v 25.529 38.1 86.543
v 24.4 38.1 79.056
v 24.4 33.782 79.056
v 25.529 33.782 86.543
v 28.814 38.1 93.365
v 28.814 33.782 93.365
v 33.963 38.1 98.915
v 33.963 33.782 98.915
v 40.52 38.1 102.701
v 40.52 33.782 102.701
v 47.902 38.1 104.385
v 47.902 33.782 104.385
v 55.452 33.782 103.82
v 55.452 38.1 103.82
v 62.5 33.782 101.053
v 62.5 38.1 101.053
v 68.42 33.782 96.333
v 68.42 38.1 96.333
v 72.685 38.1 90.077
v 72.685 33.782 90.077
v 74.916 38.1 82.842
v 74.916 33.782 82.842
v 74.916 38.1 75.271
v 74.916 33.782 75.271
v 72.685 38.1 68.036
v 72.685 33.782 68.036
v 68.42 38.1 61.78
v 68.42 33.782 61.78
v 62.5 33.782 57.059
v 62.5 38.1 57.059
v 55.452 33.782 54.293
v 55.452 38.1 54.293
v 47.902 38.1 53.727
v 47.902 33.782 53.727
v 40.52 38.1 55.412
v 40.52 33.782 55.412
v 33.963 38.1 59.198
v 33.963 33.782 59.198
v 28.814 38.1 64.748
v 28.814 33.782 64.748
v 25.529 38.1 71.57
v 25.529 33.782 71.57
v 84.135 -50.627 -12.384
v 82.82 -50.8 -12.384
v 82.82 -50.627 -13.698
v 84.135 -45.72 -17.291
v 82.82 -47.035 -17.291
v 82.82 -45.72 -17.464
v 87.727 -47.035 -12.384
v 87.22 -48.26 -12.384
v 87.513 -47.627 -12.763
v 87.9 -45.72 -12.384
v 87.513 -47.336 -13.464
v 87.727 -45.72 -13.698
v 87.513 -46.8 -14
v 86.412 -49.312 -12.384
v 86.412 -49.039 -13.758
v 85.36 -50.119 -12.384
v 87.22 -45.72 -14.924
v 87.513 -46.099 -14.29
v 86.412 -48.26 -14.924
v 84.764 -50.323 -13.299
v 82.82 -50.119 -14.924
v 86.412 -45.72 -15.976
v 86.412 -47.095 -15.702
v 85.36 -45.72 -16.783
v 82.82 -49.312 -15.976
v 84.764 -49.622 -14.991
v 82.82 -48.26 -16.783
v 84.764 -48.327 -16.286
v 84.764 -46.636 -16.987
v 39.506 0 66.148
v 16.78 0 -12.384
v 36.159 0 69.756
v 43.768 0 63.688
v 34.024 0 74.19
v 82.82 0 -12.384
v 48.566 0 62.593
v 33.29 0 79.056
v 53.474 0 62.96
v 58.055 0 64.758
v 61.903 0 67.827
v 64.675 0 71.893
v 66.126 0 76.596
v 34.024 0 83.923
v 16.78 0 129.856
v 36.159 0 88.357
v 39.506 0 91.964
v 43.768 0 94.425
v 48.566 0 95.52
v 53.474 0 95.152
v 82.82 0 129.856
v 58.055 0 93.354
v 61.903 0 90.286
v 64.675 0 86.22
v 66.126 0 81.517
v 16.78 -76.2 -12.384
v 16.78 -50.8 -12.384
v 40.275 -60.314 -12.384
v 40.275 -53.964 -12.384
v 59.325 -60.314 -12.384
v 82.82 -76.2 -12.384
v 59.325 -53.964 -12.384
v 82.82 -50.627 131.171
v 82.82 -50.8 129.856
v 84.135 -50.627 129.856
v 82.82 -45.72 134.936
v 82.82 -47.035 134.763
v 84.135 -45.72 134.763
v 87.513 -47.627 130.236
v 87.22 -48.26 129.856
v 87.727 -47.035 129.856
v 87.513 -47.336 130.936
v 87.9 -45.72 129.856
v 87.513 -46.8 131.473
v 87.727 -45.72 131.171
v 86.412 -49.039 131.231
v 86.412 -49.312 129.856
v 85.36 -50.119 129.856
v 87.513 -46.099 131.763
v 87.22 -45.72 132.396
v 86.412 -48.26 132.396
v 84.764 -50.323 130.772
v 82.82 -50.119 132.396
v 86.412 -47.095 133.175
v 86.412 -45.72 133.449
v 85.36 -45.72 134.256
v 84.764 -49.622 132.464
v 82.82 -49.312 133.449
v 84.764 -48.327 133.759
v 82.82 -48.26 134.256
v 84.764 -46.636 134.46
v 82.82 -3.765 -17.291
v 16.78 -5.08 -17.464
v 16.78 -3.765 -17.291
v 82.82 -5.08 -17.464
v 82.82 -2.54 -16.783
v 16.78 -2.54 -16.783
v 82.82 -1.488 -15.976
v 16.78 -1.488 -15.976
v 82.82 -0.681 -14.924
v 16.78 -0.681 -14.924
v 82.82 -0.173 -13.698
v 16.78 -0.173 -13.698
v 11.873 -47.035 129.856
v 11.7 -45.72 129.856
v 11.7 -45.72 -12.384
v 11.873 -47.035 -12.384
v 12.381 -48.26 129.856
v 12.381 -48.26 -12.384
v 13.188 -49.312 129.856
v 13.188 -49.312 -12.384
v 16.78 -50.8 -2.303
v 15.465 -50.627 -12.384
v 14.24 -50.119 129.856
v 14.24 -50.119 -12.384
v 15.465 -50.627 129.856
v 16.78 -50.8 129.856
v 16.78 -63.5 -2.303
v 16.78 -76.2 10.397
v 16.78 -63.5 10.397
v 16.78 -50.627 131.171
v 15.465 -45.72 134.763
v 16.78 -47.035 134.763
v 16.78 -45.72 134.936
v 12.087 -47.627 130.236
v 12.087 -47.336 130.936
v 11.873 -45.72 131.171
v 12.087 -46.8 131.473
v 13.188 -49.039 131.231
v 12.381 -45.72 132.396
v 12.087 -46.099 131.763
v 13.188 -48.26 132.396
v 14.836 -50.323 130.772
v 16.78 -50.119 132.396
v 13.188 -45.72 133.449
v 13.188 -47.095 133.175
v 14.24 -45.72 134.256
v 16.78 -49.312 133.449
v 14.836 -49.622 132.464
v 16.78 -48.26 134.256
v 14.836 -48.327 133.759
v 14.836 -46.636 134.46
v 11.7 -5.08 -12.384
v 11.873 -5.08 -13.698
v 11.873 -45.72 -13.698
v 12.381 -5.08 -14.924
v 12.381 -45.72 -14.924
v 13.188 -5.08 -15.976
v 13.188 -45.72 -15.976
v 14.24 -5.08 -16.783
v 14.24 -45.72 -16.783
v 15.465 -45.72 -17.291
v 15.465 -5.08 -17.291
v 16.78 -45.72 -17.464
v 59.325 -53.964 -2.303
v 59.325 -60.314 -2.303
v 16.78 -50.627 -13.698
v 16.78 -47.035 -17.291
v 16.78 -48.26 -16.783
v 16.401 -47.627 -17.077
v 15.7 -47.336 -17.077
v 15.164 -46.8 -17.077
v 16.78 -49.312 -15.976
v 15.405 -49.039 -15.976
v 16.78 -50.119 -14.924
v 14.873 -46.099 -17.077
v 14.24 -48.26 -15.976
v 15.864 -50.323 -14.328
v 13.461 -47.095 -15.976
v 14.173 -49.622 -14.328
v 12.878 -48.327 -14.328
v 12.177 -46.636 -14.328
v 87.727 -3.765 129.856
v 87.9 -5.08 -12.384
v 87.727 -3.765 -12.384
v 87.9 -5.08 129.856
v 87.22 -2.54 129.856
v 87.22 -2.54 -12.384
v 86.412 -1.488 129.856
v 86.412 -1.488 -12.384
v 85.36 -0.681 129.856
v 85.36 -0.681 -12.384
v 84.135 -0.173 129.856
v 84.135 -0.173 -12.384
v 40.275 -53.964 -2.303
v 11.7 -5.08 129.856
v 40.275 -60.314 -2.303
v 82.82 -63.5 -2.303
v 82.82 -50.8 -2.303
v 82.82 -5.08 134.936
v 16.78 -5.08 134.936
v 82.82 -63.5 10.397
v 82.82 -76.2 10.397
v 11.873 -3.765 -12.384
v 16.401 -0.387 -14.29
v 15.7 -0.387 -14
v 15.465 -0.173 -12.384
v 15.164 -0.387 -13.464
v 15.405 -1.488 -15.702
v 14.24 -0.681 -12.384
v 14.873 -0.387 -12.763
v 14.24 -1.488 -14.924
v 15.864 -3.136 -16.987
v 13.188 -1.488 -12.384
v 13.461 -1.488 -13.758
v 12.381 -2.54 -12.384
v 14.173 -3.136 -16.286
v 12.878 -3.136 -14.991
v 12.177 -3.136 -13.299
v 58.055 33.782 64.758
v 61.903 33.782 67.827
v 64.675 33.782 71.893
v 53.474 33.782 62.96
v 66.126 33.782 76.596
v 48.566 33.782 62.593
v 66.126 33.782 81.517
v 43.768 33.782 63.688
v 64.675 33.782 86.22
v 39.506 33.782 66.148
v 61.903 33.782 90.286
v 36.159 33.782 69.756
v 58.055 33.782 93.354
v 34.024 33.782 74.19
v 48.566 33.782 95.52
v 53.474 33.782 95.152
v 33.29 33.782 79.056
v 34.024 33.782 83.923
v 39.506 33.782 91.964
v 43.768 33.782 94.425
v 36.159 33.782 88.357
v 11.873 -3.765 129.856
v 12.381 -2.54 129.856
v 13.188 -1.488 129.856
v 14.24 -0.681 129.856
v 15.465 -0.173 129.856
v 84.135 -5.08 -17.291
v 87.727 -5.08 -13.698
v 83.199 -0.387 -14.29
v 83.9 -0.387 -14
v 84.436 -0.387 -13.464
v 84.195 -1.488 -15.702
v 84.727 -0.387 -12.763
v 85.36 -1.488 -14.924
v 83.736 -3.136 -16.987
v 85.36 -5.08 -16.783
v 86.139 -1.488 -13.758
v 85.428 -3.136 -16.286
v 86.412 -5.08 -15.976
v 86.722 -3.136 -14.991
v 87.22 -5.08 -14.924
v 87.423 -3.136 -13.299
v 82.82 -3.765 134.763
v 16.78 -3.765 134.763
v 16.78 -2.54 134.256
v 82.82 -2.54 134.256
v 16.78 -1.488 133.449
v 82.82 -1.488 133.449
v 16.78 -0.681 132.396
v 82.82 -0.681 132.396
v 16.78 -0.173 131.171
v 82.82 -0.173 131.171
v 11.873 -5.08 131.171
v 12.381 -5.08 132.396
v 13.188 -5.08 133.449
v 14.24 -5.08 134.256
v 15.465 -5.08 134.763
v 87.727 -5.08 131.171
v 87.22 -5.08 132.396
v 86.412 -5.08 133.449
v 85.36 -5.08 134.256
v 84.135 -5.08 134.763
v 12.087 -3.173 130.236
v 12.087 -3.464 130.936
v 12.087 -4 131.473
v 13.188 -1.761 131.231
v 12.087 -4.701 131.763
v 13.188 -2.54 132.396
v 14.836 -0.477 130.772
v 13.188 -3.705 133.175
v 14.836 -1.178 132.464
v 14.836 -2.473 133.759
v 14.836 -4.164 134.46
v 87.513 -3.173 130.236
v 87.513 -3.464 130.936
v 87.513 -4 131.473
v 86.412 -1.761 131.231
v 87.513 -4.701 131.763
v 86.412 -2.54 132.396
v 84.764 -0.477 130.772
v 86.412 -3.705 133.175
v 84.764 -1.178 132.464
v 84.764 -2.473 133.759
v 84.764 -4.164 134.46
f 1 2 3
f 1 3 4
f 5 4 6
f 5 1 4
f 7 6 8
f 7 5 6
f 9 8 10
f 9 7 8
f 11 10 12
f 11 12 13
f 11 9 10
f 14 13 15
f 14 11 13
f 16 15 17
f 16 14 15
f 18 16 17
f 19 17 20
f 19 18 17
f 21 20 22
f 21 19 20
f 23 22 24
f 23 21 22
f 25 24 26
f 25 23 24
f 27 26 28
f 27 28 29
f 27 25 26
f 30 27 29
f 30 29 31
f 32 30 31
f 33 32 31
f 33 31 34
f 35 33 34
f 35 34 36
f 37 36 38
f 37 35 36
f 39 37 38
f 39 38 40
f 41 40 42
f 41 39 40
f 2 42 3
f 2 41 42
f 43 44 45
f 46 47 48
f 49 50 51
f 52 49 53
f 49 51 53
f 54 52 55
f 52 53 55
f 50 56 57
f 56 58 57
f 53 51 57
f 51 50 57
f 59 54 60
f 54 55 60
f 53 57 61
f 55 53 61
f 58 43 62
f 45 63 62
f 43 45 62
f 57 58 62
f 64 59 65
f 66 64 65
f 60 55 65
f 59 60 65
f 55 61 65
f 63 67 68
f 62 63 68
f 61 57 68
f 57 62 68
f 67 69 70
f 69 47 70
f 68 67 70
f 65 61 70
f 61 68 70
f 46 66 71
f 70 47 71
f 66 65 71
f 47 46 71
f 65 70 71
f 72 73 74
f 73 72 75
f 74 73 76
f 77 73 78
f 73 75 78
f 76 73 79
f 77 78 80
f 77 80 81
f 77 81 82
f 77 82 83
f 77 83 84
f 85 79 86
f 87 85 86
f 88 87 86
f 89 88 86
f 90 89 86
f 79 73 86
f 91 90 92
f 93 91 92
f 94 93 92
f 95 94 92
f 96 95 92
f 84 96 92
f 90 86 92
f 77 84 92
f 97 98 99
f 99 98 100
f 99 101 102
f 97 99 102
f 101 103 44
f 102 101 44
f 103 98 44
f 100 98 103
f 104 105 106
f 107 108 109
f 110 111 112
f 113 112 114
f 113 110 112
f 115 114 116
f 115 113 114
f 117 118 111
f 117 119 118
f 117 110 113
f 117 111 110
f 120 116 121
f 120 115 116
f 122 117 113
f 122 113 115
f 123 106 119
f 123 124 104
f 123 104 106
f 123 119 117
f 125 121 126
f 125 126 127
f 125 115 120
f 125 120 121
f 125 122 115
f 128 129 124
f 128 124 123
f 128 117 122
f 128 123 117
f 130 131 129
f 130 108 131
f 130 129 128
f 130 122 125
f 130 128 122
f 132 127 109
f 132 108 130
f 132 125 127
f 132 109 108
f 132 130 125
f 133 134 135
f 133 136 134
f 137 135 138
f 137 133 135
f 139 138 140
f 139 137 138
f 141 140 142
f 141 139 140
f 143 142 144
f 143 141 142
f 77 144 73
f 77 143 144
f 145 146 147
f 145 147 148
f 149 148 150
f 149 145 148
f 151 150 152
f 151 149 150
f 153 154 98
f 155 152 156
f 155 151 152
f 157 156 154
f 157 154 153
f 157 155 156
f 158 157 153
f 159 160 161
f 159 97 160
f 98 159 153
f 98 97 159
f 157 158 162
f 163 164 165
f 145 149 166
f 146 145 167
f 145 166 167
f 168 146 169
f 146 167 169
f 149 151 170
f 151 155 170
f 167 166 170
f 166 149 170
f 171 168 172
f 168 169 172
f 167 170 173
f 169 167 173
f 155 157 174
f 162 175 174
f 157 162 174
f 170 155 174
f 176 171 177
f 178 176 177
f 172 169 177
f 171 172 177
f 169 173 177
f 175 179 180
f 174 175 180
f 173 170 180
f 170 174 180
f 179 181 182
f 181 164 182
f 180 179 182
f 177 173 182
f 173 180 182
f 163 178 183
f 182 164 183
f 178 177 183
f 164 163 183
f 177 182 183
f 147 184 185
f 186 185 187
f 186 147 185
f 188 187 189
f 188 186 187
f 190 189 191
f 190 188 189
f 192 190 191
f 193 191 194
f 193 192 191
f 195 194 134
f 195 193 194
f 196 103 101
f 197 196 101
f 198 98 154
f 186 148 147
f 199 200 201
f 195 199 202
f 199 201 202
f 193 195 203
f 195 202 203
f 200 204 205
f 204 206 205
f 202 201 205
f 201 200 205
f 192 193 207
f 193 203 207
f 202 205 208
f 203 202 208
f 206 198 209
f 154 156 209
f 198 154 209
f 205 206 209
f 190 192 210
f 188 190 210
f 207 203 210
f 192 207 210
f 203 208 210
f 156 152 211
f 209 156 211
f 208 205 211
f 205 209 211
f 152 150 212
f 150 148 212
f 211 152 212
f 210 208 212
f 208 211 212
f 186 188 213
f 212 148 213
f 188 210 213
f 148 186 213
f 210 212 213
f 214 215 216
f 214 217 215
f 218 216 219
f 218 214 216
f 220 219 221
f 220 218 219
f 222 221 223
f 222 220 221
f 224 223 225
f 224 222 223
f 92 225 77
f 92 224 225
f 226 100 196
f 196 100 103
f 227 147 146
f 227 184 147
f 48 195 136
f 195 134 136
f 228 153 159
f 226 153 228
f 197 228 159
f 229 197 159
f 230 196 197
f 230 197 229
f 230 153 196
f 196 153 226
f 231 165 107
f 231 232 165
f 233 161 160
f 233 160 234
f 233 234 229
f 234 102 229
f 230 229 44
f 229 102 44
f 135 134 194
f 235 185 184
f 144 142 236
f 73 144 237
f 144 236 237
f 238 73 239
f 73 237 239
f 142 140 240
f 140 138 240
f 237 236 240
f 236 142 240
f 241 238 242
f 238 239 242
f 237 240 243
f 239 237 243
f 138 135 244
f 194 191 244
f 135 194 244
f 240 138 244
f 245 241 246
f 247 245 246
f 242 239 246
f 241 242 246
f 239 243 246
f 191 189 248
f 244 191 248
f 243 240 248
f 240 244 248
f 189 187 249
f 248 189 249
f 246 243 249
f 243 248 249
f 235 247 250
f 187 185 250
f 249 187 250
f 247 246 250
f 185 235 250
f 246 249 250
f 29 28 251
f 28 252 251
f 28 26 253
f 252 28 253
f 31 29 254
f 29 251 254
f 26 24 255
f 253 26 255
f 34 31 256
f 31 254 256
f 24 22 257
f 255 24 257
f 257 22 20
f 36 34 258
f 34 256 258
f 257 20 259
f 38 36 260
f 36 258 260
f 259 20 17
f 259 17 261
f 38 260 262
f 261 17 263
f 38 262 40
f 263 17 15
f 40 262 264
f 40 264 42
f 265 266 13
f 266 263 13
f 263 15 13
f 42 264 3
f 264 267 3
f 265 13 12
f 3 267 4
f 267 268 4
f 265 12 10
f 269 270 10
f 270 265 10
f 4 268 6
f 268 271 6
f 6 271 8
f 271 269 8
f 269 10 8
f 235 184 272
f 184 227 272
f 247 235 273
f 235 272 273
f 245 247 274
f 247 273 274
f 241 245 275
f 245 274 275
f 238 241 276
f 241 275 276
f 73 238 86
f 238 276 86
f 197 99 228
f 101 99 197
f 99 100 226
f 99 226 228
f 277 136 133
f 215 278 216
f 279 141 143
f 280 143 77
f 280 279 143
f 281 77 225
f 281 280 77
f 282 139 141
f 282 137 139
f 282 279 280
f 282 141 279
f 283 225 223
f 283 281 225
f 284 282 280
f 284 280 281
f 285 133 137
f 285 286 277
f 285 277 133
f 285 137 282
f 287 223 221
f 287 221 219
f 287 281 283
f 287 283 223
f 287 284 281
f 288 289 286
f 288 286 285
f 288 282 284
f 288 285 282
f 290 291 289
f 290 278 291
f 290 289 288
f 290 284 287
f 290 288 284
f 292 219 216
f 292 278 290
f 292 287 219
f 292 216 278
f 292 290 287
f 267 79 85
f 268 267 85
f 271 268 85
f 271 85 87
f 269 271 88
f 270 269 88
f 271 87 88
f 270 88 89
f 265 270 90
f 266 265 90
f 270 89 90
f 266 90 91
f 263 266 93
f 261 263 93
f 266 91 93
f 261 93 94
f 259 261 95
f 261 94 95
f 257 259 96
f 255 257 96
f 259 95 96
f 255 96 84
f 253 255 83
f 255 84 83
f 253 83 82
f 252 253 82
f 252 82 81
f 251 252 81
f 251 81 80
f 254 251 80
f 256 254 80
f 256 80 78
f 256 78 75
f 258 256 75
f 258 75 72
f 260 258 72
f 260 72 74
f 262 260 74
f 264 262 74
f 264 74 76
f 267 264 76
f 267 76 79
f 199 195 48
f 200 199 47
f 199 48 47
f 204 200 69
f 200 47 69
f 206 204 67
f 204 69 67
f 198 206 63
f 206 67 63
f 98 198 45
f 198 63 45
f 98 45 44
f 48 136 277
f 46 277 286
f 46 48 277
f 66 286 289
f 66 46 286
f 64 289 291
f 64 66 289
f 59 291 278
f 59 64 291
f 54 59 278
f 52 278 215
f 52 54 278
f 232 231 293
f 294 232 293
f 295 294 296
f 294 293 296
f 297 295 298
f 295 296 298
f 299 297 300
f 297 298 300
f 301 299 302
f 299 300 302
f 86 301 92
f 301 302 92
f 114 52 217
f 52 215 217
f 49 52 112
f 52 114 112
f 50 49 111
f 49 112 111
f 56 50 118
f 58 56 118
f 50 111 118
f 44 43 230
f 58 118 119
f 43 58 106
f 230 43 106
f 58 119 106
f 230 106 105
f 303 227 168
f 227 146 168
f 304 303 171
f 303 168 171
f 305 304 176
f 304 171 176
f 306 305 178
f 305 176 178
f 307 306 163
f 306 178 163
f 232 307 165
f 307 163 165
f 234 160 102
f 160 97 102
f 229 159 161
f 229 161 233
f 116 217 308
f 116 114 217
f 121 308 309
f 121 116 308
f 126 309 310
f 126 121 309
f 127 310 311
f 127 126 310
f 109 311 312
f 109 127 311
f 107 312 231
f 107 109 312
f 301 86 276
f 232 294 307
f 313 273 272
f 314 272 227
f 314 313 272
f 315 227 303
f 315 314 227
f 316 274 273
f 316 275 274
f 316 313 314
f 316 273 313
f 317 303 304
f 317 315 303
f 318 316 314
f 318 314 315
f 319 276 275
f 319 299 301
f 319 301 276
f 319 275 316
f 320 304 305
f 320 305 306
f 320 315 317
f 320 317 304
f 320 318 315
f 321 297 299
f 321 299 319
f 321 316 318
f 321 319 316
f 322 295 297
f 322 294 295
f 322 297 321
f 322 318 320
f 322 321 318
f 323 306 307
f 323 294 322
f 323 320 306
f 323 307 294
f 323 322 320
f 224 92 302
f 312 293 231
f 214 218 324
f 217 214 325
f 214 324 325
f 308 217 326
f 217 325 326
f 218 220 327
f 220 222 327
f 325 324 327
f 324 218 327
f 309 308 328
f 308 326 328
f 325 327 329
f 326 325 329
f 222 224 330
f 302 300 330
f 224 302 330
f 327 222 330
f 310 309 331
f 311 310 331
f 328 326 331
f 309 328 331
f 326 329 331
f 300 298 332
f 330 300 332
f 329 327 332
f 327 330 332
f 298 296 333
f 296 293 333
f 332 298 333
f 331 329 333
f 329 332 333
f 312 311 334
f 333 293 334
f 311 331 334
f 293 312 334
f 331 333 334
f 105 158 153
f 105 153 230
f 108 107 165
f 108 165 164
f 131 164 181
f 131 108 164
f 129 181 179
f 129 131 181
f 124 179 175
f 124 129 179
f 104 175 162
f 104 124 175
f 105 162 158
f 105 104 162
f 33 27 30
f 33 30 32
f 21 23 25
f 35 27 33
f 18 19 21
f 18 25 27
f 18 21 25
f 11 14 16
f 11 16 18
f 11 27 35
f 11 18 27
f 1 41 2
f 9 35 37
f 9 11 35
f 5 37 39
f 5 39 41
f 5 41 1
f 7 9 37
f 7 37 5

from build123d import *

# Parameters (mm, degrees)
F0_W      = 76.2
F0_H      = 152.4
F1_DEPTH  = 50.8
F2_R      = 5.08
F3_W      = 66.04
F3_H      = 10.080694
F4_DEPTH  = 25.4
F5_W      = 66.04
F5_H      = 12.7
F6_DEPTH  = 12.7
F7_W      = 19.05
F7_H      = 6.35
F8_DEPTH  = 103.886
F9_R      = 16.51
F10_DEPTH = 38.1
F11_R     = 25.4
F11_R_2   = 16.51
F12_DEPTH = 4.318


with BuildPart() as f1:
    # F0 (on Front) → F1 (new body)
    with BuildSketch(Plane.XZ):
        with Locations((49.800091, 58.736403)):
            Rectangle(F0_W, F0_H)
    extrude(amount=F1_DEPTH)

    # F2
    f2_edges = [f1.edges().sort_by_distance(p)[0] for p in [
        (49.800091, -50.8, 134.936403),
        (11.700091, -50.8, 58.736403),
        (49.800091, -50.8, -17.463597),
        (87.900091, -50.8, 58.736403),
        (11.700091, -25.4, -17.463597),
        (87.900091, -25.4, -17.463597),
        (49.800091, 0, -17.463597),
        (49.800091, 0, 134.936403),
        (11.700091, 0, 58.736403),
        (87.900091, 0, 58.736403),
        (11.700091, -25.4, 134.936403),
        (87.900091, -25.4, 134.936403),
    ]]
    fillet(f2_edges, radius=F2_R)

    # F3 (on face) → F4 (join)
    with BuildSketch(Plane.XZ.offset(50.8)):
        with Locations((49.800091, -7.34325)):
            Rectangle(F3_W, F3_H)
    extrude(amount=F4_DEPTH)

    # F5 (on face) → F6 (join)
    with BuildSketch(Plane.XY.offset(-2.302903)):
        with Locations((49.800091, -69.85)):
            Rectangle(F5_W, F5_H)
    extrude(amount=F6_DEPTH)

    # F7 (on face) → F8 (cut)
    with BuildSketch(Plane(origin=(0, 0, -12.383597), x_dir=(1, 0, 0), z_dir=(0, 0, -1))):
        with Locations((49.800091, 57.138579)):
            Rectangle(F7_W, F7_H)
    extrude(amount=-F8_DEPTH, mode=Mode.SUBTRACT)

    # F9 (on face) → F10 (join)
    with BuildSketch(Plane(origin=(0, 0, 0), x_dir=(-1, 0, 0), z_dir=(0, 1, 0))):
        with Locations((-49.800091, 79.056403)):
            Circle(F9_R)
    extrude(amount=F10_DEPTH)

    # F11 (on face) → F12 (join)
    with BuildSketch(Plane(origin=(0, 38.1, 0), x_dir=(-1, 0, 0), z_dir=(0, 1, 0))):
        with Locations((-49.800091, 79.056403)):
            Circle(F11_R)
        with Locations((-49.800091, 79.056403)):
            Circle(F11_R_2, mode=Mode.SUBTRACT)
    extrude(amount=-F12_DEPTH)


solid = f1.part
